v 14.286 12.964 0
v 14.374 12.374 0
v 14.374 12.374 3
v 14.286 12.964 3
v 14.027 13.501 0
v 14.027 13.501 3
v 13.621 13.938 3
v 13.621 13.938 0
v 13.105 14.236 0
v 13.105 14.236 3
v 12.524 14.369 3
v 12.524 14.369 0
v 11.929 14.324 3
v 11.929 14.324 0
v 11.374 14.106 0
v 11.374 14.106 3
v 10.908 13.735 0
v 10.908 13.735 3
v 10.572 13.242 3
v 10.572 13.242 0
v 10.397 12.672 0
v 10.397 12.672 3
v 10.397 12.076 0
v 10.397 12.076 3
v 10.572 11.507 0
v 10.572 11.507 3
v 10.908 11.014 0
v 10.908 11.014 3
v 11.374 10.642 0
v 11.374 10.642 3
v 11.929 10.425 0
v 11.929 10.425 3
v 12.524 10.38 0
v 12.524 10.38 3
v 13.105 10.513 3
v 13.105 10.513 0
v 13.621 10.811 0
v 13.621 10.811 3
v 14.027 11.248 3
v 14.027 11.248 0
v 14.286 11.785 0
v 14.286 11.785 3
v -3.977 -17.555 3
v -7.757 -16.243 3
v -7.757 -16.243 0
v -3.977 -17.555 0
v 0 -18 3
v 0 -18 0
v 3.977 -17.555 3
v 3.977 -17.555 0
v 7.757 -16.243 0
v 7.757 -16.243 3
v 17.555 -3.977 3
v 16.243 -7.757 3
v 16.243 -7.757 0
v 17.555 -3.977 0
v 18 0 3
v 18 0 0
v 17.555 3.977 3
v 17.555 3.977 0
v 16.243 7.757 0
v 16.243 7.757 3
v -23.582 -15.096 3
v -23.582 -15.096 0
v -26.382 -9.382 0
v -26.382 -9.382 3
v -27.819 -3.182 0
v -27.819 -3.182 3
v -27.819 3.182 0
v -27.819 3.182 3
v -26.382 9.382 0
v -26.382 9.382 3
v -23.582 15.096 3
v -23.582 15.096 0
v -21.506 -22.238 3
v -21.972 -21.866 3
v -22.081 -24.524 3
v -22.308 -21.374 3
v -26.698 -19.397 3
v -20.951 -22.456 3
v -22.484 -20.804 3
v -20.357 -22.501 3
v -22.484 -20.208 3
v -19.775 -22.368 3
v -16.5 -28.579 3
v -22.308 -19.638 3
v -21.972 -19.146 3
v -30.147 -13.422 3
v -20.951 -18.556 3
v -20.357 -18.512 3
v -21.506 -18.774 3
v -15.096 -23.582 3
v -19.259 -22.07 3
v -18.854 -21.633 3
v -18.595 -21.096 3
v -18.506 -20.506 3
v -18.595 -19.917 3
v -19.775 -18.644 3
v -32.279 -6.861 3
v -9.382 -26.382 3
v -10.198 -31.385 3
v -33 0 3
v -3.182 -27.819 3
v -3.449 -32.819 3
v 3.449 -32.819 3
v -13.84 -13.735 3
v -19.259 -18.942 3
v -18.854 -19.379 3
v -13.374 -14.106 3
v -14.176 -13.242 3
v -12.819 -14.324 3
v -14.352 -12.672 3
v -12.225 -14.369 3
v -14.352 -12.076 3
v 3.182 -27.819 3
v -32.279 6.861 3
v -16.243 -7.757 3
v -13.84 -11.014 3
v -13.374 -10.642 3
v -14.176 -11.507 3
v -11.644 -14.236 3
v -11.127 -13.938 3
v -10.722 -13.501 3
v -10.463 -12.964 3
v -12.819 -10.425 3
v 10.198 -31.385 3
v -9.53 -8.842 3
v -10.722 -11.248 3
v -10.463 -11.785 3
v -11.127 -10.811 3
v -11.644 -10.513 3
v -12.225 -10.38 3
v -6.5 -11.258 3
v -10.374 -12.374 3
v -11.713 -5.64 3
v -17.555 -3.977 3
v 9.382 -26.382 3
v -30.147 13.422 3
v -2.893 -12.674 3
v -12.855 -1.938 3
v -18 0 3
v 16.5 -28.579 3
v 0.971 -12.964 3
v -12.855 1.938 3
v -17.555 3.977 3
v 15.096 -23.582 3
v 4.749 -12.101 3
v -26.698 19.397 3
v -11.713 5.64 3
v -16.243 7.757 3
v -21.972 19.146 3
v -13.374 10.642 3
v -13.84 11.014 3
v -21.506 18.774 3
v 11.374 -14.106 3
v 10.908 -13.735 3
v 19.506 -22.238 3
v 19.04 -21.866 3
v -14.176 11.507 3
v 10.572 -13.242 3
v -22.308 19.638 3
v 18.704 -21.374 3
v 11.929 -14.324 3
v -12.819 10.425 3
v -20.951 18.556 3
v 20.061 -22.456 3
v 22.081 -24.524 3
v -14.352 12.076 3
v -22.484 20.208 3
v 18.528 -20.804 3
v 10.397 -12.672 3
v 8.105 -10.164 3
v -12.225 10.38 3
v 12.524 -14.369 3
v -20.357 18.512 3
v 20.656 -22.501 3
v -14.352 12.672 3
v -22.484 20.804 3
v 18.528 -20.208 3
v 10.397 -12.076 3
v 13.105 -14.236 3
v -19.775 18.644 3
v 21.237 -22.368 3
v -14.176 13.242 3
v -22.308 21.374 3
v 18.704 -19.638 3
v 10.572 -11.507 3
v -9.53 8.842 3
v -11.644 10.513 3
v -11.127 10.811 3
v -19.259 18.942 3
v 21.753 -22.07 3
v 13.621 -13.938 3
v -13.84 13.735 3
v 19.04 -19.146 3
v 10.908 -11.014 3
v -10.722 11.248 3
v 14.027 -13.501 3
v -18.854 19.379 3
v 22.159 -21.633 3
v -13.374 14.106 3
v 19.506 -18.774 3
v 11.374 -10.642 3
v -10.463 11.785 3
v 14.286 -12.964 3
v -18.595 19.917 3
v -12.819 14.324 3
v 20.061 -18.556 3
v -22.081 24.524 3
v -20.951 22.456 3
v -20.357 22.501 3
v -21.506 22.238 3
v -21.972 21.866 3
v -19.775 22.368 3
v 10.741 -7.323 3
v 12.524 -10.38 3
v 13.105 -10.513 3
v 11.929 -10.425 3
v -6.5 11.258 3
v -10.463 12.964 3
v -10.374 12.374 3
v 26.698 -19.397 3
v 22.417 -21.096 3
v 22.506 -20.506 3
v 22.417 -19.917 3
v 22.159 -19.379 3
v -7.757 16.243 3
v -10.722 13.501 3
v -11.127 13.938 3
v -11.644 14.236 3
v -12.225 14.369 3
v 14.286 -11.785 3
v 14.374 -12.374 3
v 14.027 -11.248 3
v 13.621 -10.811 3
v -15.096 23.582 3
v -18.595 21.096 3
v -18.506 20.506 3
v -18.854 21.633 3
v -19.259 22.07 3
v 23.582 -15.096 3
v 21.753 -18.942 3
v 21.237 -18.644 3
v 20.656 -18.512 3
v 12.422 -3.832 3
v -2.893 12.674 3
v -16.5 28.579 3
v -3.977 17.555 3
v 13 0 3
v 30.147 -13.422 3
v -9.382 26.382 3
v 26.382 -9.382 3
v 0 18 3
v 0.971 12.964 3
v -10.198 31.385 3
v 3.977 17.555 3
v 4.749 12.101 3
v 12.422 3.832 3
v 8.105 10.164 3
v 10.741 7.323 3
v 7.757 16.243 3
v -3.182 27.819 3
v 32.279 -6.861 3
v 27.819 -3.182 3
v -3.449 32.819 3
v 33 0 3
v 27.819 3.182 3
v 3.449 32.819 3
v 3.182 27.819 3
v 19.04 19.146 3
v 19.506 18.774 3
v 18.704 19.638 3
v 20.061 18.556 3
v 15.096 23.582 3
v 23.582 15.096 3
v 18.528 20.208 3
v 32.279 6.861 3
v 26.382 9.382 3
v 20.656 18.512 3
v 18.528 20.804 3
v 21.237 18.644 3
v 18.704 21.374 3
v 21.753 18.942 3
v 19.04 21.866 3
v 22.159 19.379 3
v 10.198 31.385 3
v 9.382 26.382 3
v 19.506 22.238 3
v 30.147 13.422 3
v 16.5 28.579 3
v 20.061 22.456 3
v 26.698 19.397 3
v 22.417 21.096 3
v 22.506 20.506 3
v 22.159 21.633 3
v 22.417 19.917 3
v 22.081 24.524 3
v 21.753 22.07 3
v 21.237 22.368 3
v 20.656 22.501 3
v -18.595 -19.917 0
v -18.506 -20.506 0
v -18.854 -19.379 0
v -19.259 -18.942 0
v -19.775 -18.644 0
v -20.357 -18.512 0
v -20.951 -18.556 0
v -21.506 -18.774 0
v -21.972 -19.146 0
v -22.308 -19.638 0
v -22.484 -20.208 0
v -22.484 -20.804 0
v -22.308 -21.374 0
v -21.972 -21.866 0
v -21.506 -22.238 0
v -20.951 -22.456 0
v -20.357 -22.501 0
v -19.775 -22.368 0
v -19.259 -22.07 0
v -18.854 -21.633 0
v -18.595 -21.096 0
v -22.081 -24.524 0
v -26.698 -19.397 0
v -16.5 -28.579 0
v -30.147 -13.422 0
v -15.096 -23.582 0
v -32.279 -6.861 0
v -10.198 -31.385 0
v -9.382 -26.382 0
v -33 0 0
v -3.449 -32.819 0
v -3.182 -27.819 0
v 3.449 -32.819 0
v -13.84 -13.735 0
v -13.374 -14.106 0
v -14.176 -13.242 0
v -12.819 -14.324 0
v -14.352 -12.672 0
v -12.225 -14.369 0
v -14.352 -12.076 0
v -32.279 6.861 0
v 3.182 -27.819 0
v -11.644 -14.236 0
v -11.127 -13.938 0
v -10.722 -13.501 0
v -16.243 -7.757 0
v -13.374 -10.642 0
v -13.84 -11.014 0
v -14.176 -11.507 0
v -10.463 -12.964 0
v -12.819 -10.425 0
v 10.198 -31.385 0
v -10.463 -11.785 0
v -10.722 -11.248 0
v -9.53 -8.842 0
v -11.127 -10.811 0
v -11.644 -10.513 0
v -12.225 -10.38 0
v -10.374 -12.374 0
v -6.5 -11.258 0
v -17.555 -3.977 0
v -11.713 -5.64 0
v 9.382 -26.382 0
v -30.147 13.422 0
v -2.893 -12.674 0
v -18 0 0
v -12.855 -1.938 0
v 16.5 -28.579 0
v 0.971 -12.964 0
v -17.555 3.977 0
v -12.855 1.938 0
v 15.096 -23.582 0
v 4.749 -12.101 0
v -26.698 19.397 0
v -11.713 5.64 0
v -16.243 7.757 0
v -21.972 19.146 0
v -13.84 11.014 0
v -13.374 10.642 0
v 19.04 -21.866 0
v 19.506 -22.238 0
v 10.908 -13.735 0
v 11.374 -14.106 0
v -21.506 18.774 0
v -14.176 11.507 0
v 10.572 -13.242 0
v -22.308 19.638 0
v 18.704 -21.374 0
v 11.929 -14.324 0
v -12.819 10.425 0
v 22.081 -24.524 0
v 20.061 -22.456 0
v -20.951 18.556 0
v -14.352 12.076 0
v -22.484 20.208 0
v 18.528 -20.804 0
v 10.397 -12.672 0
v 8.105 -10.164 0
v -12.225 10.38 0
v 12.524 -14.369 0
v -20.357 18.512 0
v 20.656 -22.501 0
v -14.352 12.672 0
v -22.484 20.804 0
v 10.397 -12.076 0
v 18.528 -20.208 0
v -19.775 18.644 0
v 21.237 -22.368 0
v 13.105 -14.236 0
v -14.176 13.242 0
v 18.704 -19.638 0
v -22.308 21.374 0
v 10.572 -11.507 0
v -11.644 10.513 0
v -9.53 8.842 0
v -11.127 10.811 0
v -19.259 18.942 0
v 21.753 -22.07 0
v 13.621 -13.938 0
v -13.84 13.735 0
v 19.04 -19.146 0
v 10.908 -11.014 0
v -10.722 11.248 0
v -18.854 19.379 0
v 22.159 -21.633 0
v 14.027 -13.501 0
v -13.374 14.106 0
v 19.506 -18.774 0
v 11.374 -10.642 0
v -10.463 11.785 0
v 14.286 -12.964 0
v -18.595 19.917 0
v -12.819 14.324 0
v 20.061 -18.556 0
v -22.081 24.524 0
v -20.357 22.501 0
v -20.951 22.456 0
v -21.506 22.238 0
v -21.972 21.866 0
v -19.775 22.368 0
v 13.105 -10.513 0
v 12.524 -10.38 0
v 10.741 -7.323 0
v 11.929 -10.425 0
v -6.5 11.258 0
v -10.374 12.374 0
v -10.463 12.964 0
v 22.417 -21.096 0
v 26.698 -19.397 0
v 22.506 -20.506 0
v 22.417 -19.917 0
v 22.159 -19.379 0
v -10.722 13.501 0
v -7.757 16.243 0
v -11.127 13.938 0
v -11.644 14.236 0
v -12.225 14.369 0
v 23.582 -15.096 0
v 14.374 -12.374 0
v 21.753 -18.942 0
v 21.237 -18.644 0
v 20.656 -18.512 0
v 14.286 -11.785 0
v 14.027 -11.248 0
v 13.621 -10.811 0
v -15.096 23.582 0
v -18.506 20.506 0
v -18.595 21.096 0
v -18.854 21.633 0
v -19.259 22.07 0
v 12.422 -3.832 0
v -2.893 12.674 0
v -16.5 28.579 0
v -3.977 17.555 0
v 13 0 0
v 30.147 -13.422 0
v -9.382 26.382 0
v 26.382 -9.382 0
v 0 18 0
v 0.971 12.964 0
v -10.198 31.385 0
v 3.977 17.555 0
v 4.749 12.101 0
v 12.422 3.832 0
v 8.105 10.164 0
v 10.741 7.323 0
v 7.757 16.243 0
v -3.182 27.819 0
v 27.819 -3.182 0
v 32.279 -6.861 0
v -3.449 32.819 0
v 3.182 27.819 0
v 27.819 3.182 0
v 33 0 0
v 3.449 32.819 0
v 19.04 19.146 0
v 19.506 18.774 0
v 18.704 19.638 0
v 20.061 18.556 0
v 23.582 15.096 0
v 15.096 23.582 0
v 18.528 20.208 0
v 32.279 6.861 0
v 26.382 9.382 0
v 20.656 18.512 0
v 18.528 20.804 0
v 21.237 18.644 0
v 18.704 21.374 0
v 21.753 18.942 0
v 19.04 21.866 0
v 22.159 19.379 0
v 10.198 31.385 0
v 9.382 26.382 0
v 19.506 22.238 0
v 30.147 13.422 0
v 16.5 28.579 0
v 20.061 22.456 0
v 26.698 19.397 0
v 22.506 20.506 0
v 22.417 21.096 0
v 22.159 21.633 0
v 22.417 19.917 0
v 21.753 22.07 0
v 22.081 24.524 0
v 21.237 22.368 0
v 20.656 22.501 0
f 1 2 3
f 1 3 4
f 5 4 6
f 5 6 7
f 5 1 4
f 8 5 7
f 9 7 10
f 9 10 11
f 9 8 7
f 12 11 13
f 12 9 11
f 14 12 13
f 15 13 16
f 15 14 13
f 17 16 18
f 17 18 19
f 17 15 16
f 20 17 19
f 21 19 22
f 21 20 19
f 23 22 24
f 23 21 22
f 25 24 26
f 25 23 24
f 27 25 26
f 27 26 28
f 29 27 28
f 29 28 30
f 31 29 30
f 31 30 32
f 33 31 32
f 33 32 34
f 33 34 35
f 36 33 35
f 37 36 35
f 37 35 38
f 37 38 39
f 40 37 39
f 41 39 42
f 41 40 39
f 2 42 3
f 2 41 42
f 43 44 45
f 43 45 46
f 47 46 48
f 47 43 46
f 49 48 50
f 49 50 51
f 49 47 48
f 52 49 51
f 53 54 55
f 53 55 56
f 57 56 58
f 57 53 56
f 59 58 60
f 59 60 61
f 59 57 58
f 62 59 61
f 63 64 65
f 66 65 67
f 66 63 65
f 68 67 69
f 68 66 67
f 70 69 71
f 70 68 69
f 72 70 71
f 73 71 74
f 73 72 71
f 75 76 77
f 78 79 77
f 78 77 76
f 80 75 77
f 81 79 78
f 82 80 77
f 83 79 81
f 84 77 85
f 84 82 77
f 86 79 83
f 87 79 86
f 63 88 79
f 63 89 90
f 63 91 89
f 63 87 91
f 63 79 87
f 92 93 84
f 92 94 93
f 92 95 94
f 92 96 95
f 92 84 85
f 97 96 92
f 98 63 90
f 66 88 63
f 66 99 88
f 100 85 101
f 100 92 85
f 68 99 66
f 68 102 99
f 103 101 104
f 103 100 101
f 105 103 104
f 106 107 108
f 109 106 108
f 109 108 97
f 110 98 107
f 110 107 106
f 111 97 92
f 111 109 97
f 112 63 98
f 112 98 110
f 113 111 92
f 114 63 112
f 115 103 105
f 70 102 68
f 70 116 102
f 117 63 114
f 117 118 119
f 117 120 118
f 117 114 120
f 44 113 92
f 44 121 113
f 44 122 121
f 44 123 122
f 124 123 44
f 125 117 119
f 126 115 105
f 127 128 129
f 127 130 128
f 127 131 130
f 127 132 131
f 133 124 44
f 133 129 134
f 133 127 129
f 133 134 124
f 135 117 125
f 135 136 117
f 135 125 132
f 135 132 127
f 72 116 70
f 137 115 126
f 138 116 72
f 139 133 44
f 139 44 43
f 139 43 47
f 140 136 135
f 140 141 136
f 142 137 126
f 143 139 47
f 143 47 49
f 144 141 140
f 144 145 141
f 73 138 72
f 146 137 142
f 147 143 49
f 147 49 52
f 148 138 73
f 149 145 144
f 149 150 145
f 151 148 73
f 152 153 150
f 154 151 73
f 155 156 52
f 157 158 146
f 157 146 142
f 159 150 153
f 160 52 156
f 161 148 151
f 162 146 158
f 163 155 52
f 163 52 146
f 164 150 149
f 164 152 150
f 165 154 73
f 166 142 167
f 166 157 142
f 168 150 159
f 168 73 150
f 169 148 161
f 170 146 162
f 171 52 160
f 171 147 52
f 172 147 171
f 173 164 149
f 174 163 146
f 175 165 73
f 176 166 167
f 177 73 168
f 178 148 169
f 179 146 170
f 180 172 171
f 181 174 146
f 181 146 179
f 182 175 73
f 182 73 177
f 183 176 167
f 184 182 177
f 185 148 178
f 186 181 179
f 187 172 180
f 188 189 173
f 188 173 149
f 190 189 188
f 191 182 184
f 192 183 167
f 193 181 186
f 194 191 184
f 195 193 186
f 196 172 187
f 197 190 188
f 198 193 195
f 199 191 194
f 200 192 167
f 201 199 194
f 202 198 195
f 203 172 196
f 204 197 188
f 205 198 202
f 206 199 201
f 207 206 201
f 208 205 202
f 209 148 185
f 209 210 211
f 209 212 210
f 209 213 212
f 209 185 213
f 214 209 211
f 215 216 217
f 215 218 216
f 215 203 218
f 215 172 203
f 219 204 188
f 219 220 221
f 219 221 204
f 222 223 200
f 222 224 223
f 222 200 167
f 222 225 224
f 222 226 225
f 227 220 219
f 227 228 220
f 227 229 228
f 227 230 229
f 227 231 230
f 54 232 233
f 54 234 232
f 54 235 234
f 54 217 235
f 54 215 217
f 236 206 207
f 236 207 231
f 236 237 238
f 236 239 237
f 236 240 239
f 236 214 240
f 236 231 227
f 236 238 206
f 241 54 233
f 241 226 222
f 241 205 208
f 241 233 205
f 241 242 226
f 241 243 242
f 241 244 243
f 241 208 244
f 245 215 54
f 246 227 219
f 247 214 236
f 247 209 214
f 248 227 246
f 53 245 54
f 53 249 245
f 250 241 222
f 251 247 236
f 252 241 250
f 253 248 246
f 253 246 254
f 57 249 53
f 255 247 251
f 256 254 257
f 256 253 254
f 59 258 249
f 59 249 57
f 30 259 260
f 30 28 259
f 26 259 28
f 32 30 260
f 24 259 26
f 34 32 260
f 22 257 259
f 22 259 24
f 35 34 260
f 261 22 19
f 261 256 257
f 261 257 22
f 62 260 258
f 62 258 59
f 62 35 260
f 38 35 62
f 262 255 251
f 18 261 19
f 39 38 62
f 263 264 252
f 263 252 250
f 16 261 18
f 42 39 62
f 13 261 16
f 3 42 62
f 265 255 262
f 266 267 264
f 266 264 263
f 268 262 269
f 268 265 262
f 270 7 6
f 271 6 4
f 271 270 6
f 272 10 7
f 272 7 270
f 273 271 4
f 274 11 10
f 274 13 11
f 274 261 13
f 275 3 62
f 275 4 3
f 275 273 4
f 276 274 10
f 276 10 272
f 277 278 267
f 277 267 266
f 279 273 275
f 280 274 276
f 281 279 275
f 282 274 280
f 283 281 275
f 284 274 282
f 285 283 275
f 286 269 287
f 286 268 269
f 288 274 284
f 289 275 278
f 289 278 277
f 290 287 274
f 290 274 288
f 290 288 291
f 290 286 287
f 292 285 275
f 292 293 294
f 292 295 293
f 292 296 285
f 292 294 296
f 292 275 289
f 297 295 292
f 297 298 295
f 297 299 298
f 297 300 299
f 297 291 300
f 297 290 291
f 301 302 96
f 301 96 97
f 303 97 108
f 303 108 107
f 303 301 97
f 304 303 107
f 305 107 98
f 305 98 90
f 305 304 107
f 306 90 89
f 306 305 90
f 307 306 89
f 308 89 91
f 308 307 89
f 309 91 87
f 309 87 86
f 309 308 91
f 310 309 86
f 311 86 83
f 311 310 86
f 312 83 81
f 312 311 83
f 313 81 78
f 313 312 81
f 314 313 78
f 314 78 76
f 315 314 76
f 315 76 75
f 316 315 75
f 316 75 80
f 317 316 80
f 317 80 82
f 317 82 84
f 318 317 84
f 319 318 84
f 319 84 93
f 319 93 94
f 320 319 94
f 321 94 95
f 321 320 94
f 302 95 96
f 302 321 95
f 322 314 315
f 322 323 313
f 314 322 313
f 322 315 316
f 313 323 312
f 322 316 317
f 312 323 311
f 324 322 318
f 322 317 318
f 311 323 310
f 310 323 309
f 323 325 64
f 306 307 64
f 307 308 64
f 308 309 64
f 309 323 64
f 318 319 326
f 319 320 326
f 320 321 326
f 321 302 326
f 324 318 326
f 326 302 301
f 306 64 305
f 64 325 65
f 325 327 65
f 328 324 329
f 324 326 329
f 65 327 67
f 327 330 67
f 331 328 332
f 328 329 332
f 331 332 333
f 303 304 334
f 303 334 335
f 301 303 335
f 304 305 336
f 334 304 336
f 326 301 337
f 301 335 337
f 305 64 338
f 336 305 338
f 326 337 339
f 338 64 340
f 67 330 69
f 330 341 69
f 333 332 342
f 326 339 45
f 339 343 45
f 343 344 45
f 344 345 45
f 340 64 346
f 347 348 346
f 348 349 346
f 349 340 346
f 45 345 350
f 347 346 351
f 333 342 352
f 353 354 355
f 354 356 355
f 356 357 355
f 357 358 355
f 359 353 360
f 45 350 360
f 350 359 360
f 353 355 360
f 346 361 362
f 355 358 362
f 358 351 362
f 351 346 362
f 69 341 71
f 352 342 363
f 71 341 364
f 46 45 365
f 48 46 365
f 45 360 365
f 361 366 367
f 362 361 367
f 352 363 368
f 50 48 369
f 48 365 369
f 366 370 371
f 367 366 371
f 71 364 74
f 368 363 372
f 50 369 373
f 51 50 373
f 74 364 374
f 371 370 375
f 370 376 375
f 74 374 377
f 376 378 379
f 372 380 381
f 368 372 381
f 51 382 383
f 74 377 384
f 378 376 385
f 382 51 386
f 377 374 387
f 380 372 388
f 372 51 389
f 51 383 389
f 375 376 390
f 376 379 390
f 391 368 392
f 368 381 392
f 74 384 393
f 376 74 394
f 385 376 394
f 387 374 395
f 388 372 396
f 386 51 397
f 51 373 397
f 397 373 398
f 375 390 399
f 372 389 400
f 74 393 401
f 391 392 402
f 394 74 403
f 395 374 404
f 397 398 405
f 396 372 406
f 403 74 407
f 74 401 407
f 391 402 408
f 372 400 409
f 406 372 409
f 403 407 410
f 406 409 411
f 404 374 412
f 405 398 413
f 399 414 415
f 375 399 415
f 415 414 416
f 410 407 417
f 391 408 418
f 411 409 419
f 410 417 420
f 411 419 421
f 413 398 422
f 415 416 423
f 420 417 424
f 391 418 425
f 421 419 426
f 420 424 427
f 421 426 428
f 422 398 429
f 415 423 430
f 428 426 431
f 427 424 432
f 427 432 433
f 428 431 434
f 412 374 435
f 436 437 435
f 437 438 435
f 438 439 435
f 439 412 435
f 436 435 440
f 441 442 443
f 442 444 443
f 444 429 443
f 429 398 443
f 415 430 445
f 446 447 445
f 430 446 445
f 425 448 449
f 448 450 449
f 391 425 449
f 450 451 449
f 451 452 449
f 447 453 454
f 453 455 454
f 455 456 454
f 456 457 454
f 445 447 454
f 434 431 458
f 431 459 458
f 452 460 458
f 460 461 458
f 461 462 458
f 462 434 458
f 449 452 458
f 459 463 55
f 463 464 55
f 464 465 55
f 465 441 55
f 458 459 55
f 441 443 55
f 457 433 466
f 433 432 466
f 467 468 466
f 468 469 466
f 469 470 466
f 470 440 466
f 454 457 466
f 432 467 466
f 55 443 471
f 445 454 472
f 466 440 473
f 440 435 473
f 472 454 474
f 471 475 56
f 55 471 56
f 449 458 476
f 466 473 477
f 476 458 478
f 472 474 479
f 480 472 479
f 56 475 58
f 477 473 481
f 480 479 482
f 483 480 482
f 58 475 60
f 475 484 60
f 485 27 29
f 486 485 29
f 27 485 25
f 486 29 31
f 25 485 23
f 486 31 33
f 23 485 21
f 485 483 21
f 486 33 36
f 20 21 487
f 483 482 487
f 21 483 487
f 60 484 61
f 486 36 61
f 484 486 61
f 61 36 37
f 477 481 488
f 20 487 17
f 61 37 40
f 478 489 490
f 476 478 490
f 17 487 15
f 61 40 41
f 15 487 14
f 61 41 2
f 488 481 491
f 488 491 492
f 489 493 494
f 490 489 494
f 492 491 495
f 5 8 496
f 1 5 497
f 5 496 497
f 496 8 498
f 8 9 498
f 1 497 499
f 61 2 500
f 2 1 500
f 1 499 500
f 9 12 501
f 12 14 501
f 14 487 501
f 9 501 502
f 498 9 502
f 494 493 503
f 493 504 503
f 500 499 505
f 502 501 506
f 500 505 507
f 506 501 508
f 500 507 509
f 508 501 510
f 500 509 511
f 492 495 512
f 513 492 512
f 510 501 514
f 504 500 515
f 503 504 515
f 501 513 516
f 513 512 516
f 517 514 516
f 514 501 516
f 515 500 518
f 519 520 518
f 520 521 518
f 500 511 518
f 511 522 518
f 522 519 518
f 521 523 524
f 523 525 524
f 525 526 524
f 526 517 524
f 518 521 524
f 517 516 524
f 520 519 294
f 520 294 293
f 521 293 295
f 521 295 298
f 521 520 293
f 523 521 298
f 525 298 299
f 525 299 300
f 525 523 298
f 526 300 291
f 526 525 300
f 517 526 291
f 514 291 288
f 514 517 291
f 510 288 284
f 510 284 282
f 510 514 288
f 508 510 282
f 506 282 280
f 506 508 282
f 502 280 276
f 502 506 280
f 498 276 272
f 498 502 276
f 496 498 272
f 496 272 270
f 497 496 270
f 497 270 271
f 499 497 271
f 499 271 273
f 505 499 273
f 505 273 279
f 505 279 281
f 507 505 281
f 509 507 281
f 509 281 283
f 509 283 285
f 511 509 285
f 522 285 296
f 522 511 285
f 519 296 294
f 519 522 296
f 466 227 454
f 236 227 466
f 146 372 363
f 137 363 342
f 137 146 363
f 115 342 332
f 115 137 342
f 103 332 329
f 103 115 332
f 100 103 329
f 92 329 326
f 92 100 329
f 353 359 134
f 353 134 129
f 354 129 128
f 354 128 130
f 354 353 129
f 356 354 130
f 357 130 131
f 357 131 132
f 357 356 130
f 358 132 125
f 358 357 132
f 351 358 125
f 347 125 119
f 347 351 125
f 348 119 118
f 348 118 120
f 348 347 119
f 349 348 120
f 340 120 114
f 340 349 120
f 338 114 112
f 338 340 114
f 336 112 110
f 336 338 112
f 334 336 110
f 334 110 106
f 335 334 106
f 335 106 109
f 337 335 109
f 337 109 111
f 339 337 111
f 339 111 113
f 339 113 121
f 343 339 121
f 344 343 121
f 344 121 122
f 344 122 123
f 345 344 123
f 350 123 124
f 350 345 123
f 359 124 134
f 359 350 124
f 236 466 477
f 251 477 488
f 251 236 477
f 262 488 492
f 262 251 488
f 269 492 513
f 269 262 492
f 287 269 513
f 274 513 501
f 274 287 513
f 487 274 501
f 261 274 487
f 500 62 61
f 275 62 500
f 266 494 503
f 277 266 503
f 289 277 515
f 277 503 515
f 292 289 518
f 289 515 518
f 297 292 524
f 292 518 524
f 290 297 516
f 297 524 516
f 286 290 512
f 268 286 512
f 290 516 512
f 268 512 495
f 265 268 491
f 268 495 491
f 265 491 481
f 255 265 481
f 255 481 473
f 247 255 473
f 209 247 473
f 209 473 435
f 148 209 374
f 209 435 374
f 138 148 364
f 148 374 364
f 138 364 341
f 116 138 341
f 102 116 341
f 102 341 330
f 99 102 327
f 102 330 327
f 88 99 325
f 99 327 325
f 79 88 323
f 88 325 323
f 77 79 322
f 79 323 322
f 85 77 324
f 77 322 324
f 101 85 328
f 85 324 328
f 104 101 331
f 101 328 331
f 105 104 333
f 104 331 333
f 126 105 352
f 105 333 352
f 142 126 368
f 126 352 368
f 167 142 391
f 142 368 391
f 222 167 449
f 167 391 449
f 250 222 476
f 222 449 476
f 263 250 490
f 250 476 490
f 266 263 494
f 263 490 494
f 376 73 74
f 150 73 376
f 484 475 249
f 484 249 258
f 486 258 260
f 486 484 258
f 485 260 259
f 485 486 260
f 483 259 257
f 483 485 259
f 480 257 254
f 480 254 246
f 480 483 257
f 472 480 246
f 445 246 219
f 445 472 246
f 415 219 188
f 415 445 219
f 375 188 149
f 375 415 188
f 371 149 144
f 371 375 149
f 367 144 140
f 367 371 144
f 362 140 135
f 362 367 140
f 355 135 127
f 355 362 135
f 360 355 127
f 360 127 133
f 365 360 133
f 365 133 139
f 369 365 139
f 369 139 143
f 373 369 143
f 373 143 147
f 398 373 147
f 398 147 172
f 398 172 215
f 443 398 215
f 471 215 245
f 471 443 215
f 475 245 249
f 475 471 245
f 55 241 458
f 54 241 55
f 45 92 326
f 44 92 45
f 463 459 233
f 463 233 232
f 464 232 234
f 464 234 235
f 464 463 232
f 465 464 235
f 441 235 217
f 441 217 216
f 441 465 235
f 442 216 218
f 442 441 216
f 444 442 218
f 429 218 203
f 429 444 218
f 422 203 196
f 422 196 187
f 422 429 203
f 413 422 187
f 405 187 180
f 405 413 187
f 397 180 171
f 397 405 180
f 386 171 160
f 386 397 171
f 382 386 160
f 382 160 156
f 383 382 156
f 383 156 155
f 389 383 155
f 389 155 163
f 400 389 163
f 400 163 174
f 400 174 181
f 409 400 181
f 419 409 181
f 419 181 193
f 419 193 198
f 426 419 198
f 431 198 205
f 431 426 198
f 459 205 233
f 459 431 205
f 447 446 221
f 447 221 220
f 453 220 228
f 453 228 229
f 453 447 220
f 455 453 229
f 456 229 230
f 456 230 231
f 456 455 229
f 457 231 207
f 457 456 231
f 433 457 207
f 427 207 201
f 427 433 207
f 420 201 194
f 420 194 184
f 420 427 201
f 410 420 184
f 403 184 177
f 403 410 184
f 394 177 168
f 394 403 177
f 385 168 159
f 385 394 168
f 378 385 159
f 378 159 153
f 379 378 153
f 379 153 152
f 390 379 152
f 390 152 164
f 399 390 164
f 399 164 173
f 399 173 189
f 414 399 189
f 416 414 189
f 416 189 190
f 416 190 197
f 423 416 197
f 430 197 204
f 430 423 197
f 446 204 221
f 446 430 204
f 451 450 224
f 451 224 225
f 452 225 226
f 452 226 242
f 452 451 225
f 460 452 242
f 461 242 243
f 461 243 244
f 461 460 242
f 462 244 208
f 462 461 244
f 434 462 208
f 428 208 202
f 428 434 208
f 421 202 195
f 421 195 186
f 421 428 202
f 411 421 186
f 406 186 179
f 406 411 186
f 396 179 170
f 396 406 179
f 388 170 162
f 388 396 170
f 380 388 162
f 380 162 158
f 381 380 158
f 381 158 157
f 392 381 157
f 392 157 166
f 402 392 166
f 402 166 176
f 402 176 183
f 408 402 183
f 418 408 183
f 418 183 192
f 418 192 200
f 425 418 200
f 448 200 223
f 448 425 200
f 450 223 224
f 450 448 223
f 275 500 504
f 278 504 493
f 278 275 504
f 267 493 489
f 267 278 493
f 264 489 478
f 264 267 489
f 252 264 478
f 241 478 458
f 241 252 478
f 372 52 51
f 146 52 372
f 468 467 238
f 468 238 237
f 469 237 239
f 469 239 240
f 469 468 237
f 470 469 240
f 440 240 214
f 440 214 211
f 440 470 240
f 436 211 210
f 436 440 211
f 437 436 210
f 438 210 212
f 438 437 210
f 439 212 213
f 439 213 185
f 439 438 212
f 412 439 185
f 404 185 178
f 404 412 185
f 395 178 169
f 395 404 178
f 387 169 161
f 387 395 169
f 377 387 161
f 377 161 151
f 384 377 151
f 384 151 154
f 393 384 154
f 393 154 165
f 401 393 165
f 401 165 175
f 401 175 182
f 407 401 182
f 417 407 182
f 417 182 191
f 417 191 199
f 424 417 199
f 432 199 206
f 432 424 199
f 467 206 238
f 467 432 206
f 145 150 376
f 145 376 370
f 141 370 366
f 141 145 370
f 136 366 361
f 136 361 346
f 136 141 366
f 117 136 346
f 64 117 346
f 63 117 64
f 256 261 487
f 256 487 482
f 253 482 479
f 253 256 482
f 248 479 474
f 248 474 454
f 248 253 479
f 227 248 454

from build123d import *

# Parameters (mm, degrees)
SKETCH_1_R          = 33
SKETCH_1_R_2        = 2
SKETCH_1_R_3        = 13
EXTRUDE_1_DEPTH     = 3
CUT_EXTRUDE_1_DEPTH = 47.765371804


with BuildPart() as part:
    # 草图1 → 凸台-拉伸1 (new body)
    with BuildSketch(Plane.XY):
        Circle(SKETCH_1_R)
        with Locations((-20.506096654, 20.506096654)):
            Circle(SKETCH_1_R_2, mode=Mode.SUBTRACT)
        with Locations((20.506096654, 20.506096654)):
            Circle(SKETCH_1_R_2, mode=Mode.SUBTRACT)
        with Locations((20.506096654, -20.506096654)):
            Circle(SKETCH_1_R_2, mode=Mode.SUBTRACT)
        with Locations((-20.506096654, -20.506096654)):
            Circle(SKETCH_1_R_2, mode=Mode.SUBTRACT)
        with Locations((-12.374368671, 12.374368671)):
            Circle(SKETCH_1_R_2, mode=Mode.SUBTRACT)
        with Locations((12.374368671, 12.374368671)):
            Circle(SKETCH_1_R_2, mode=Mode.SUBTRACT)
        with Locations((12.374368671, -12.374368671)):
            Circle(SKETCH_1_R_2, mode=Mode.SUBTRACT)
        with Locations((-12.374368671, -12.374368671)):
            Circle(SKETCH_1_R_2, mode=Mode.SUBTRACT)
        Circle(SKETCH_1_R_3, mode=Mode.SUBTRACT)
    extrude(amount=EXTRUDE_1_DEPTH)

    # 草图2 → 切除-拉伸1 (cut, through all)
    with BuildSketch(Plane.XY.offset(3)):
        with BuildLine():
            Line((-7.757359313, 16.242640687), (-15.096438919, 23.581720293))
            ThreePointArc((-15.096438919, 23.581720293), (0, 28), (15.096438919, 23.581720293))
            Line((15.096438919, 23.581720293), (7.757359313, 16.242640687))
            ThreePointArc((7.757359313, 16.242640687), (0, 18), (-7.757359313, 16.242640687))
        make_face()
        with BuildLine():
            Line((16.242640687, 7.757359313), (23.581720293, 15.096438919))
            ThreePointArc((23.581720293, 15.096438919), (28, 0), (23.581720293, -15.096438919))
            Line((23.581720293, -15.096438919), (16.242640687, -7.757359313))
            ThreePointArc((16.242640687, -7.757359313), (18, 0), (16.242640687, 7.757359313))
        make_face()
        with BuildLine():
            Line((7.757359313, -16.242640687), (15.096438919, -23.581720293))
            ThreePointArc((15.096438919, -23.581720293), (0, -28), (-15.096438919, -23.581720293))
            Line((-15.096438919, -23.581720293), (-7.757359313, -16.242640687))
            ThreePointArc((-7.757359313, -16.242640687), (0, -18), (7.757359313, -16.242640687))
        make_face()
        with BuildLine():
            Line((-16.242640687, -7.757359313), (-23.581720293, -15.096438919))
            ThreePointArc((-23.581720293, -15.096438919), (-28, 0), (-23.581720293, 15.096438919))
            Line((-23.581720293, 15.096438919), (-16.242640687, 7.757359313))
            ThreePointArc((-16.242640687, 7.757359313), (-18, 0), (-16.242640687, -7.757359313))
        make_face()
    extrude(amount=-CUT_EXTRUDE_1_DEPTH, mode=Mode.SUBTRACT)


solid = part.part
